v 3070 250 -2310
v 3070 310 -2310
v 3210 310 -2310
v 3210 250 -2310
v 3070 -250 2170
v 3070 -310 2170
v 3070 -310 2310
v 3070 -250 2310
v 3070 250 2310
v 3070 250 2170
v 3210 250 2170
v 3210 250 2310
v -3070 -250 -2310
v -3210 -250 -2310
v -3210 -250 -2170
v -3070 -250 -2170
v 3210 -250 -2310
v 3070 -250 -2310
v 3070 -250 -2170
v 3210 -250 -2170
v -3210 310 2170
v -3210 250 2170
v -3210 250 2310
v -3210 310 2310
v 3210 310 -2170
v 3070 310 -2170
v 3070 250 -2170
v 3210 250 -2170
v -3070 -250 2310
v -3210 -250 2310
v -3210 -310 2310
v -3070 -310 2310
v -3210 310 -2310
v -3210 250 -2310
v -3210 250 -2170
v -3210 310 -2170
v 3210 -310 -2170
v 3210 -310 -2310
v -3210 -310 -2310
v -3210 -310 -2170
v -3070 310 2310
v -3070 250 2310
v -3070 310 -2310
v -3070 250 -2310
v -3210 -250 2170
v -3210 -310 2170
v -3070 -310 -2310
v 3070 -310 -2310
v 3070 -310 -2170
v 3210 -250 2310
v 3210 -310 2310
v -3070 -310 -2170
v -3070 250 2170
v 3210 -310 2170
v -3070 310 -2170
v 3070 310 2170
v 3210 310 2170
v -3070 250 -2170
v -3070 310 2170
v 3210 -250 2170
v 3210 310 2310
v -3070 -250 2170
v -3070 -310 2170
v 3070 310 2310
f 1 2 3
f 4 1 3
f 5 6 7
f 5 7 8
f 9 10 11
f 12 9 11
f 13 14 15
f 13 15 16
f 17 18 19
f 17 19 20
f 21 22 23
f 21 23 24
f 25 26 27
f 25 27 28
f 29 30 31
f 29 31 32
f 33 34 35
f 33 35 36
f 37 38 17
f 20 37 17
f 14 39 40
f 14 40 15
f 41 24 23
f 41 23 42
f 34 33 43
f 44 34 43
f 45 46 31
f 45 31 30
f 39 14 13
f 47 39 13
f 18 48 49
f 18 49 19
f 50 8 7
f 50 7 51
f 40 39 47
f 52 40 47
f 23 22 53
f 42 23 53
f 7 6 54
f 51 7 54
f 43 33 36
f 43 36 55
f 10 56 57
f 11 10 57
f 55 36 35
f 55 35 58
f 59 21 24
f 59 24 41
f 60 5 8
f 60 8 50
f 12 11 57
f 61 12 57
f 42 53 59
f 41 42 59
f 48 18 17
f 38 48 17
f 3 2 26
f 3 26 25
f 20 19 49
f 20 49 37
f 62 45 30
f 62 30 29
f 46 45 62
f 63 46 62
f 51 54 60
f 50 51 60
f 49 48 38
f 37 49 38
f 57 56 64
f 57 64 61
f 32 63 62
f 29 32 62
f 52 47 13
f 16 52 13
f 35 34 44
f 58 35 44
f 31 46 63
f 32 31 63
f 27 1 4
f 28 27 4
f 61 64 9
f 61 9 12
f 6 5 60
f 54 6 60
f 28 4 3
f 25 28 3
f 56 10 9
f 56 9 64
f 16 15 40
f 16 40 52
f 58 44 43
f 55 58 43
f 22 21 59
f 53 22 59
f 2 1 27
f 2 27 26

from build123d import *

# Parameters (mm, degrees)
BOSS_EXTRUDE1_START = -2310
SKETCH1_W           = 140
SKETCH1_H           = 60
BOSS_EXTRUDE1_DEPTH = 140
BOSS_EXTRUDE2_START = 2170
SKETCH2_W           = 140
SKETCH2_H           = 60
BOSS_EXTRUDE2_DEPTH = 140
BOSS_EXTRUDE3_START = -2310
SKETCH3_W           = 140
SKETCH3_H           = 60
BOSS_EXTRUDE3_DEPTH = 140
BOSS_EXTRUDE4_START = 2170
SKETCH4_W           = 140
SKETCH4_H           = 60
BOSS_EXTRUDE4_DEPTH = 140
BOSS_EXTRUDE5_START = -2310
SKETCH5_W           = 140
SKETCH5_H           = 60
BOSS_EXTRUDE5_DEPTH = 140
BOSS_EXTRUDE6_START = 2170
SKETCH6_W           = 140
SKETCH6_H           = 60
BOSS_EXTRUDE6_DEPTH = 140
BOSS_EXTRUDE7_START = -2310
SKETCH7_W           = 140
SKETCH7_H           = 60
BOSS_EXTRUDE7_DEPTH = 140
BOSS_EXTRUDE8_START = 2170
SKETCH8_W           = 140
SKETCH8_H           = 60
BOSS_EXTRUDE8_DEPTH = 140


with BuildPart() as part:
    # Sketch1 → Boss-Extrude1 (new body)
    with BuildSketch(Plane.XY.offset(BOSS_EXTRUDE1_START)):
        with Locations((-3140, -280)):
            Rectangle(SKETCH1_W, SKETCH1_H)
    extrude(amount=BOSS_EXTRUDE1_DEPTH)


with BuildPart() as body_2:
    # Sketch2 → Boss-Extrude2 (new body)
    with BuildSketch(Plane.XY.offset(BOSS_EXTRUDE2_START)):
        with Locations((-3140, -280)):
            Rectangle(SKETCH2_W, SKETCH2_H)
    extrude(amount=BOSS_EXTRUDE2_DEPTH)


with BuildPart() as body_3:
    # Sketch3 → Boss-Extrude3 (new body)
    with BuildSketch(Plane.XY.offset(BOSS_EXTRUDE3_START)):
        with Locations((-3140, 280)):
            Rectangle(SKETCH3_W, SKETCH3_H)
    extrude(amount=BOSS_EXTRUDE3_DEPTH)


with BuildPart() as body_4:
    # Sketch4 → Boss-Extrude4 (new body)
    with BuildSketch(Plane.XY.offset(BOSS_EXTRUDE4_START)):
        with Locations((-3140, 280)):
            Rectangle(SKETCH4_W, SKETCH4_H)
    extrude(amount=BOSS_EXTRUDE4_DEPTH)


with BuildPart() as body_5:
    # Sketch5 → Boss-Extrude5 (new body)
    with BuildSketch(Plane.XY.offset(BOSS_EXTRUDE5_START)):
        with Locations((3140, -280)):
            Rectangle(SKETCH5_W, SKETCH5_H)
    extrude(amount=BOSS_EXTRUDE5_DEPTH)


with BuildPart() as body_6:
    # Sketch6 → Boss-Extrude6 (new body)
    with BuildSketch(Plane.XY.offset(BOSS_EXTRUDE6_START)):
        with Locations((3140, -280)):
            Rectangle(SKETCH6_W, SKETCH6_H)
    extrude(amount=BOSS_EXTRUDE6_DEPTH)


with BuildPart() as body_7:
    # Sketch7 → Boss-Extrude7 (new body)
    with BuildSketch(Plane.XY.offset(BOSS_EXTRUDE7_START)):
        with Locations((3140, 280)):
            Rectangle(SKETCH7_W, SKETCH7_H)
    extrude(amount=BOSS_EXTRUDE7_DEPTH)


with BuildPart() as body_8:
    # Sketch8 → Boss-Extrude8 (new body)
    with BuildSketch(Plane.XY.offset(BOSS_EXTRUDE8_START)):
        with Locations((3140, 280)):
            Rectangle(SKETCH8_W, SKETCH8_H)
    extrude(amount=BOSS_EXTRUDE8_DEPTH)


solid = Compound([part.part, body_2.part, body_3.part, body_4.part, body_5.part, body_6.part, body_7.part, body_8.part])
